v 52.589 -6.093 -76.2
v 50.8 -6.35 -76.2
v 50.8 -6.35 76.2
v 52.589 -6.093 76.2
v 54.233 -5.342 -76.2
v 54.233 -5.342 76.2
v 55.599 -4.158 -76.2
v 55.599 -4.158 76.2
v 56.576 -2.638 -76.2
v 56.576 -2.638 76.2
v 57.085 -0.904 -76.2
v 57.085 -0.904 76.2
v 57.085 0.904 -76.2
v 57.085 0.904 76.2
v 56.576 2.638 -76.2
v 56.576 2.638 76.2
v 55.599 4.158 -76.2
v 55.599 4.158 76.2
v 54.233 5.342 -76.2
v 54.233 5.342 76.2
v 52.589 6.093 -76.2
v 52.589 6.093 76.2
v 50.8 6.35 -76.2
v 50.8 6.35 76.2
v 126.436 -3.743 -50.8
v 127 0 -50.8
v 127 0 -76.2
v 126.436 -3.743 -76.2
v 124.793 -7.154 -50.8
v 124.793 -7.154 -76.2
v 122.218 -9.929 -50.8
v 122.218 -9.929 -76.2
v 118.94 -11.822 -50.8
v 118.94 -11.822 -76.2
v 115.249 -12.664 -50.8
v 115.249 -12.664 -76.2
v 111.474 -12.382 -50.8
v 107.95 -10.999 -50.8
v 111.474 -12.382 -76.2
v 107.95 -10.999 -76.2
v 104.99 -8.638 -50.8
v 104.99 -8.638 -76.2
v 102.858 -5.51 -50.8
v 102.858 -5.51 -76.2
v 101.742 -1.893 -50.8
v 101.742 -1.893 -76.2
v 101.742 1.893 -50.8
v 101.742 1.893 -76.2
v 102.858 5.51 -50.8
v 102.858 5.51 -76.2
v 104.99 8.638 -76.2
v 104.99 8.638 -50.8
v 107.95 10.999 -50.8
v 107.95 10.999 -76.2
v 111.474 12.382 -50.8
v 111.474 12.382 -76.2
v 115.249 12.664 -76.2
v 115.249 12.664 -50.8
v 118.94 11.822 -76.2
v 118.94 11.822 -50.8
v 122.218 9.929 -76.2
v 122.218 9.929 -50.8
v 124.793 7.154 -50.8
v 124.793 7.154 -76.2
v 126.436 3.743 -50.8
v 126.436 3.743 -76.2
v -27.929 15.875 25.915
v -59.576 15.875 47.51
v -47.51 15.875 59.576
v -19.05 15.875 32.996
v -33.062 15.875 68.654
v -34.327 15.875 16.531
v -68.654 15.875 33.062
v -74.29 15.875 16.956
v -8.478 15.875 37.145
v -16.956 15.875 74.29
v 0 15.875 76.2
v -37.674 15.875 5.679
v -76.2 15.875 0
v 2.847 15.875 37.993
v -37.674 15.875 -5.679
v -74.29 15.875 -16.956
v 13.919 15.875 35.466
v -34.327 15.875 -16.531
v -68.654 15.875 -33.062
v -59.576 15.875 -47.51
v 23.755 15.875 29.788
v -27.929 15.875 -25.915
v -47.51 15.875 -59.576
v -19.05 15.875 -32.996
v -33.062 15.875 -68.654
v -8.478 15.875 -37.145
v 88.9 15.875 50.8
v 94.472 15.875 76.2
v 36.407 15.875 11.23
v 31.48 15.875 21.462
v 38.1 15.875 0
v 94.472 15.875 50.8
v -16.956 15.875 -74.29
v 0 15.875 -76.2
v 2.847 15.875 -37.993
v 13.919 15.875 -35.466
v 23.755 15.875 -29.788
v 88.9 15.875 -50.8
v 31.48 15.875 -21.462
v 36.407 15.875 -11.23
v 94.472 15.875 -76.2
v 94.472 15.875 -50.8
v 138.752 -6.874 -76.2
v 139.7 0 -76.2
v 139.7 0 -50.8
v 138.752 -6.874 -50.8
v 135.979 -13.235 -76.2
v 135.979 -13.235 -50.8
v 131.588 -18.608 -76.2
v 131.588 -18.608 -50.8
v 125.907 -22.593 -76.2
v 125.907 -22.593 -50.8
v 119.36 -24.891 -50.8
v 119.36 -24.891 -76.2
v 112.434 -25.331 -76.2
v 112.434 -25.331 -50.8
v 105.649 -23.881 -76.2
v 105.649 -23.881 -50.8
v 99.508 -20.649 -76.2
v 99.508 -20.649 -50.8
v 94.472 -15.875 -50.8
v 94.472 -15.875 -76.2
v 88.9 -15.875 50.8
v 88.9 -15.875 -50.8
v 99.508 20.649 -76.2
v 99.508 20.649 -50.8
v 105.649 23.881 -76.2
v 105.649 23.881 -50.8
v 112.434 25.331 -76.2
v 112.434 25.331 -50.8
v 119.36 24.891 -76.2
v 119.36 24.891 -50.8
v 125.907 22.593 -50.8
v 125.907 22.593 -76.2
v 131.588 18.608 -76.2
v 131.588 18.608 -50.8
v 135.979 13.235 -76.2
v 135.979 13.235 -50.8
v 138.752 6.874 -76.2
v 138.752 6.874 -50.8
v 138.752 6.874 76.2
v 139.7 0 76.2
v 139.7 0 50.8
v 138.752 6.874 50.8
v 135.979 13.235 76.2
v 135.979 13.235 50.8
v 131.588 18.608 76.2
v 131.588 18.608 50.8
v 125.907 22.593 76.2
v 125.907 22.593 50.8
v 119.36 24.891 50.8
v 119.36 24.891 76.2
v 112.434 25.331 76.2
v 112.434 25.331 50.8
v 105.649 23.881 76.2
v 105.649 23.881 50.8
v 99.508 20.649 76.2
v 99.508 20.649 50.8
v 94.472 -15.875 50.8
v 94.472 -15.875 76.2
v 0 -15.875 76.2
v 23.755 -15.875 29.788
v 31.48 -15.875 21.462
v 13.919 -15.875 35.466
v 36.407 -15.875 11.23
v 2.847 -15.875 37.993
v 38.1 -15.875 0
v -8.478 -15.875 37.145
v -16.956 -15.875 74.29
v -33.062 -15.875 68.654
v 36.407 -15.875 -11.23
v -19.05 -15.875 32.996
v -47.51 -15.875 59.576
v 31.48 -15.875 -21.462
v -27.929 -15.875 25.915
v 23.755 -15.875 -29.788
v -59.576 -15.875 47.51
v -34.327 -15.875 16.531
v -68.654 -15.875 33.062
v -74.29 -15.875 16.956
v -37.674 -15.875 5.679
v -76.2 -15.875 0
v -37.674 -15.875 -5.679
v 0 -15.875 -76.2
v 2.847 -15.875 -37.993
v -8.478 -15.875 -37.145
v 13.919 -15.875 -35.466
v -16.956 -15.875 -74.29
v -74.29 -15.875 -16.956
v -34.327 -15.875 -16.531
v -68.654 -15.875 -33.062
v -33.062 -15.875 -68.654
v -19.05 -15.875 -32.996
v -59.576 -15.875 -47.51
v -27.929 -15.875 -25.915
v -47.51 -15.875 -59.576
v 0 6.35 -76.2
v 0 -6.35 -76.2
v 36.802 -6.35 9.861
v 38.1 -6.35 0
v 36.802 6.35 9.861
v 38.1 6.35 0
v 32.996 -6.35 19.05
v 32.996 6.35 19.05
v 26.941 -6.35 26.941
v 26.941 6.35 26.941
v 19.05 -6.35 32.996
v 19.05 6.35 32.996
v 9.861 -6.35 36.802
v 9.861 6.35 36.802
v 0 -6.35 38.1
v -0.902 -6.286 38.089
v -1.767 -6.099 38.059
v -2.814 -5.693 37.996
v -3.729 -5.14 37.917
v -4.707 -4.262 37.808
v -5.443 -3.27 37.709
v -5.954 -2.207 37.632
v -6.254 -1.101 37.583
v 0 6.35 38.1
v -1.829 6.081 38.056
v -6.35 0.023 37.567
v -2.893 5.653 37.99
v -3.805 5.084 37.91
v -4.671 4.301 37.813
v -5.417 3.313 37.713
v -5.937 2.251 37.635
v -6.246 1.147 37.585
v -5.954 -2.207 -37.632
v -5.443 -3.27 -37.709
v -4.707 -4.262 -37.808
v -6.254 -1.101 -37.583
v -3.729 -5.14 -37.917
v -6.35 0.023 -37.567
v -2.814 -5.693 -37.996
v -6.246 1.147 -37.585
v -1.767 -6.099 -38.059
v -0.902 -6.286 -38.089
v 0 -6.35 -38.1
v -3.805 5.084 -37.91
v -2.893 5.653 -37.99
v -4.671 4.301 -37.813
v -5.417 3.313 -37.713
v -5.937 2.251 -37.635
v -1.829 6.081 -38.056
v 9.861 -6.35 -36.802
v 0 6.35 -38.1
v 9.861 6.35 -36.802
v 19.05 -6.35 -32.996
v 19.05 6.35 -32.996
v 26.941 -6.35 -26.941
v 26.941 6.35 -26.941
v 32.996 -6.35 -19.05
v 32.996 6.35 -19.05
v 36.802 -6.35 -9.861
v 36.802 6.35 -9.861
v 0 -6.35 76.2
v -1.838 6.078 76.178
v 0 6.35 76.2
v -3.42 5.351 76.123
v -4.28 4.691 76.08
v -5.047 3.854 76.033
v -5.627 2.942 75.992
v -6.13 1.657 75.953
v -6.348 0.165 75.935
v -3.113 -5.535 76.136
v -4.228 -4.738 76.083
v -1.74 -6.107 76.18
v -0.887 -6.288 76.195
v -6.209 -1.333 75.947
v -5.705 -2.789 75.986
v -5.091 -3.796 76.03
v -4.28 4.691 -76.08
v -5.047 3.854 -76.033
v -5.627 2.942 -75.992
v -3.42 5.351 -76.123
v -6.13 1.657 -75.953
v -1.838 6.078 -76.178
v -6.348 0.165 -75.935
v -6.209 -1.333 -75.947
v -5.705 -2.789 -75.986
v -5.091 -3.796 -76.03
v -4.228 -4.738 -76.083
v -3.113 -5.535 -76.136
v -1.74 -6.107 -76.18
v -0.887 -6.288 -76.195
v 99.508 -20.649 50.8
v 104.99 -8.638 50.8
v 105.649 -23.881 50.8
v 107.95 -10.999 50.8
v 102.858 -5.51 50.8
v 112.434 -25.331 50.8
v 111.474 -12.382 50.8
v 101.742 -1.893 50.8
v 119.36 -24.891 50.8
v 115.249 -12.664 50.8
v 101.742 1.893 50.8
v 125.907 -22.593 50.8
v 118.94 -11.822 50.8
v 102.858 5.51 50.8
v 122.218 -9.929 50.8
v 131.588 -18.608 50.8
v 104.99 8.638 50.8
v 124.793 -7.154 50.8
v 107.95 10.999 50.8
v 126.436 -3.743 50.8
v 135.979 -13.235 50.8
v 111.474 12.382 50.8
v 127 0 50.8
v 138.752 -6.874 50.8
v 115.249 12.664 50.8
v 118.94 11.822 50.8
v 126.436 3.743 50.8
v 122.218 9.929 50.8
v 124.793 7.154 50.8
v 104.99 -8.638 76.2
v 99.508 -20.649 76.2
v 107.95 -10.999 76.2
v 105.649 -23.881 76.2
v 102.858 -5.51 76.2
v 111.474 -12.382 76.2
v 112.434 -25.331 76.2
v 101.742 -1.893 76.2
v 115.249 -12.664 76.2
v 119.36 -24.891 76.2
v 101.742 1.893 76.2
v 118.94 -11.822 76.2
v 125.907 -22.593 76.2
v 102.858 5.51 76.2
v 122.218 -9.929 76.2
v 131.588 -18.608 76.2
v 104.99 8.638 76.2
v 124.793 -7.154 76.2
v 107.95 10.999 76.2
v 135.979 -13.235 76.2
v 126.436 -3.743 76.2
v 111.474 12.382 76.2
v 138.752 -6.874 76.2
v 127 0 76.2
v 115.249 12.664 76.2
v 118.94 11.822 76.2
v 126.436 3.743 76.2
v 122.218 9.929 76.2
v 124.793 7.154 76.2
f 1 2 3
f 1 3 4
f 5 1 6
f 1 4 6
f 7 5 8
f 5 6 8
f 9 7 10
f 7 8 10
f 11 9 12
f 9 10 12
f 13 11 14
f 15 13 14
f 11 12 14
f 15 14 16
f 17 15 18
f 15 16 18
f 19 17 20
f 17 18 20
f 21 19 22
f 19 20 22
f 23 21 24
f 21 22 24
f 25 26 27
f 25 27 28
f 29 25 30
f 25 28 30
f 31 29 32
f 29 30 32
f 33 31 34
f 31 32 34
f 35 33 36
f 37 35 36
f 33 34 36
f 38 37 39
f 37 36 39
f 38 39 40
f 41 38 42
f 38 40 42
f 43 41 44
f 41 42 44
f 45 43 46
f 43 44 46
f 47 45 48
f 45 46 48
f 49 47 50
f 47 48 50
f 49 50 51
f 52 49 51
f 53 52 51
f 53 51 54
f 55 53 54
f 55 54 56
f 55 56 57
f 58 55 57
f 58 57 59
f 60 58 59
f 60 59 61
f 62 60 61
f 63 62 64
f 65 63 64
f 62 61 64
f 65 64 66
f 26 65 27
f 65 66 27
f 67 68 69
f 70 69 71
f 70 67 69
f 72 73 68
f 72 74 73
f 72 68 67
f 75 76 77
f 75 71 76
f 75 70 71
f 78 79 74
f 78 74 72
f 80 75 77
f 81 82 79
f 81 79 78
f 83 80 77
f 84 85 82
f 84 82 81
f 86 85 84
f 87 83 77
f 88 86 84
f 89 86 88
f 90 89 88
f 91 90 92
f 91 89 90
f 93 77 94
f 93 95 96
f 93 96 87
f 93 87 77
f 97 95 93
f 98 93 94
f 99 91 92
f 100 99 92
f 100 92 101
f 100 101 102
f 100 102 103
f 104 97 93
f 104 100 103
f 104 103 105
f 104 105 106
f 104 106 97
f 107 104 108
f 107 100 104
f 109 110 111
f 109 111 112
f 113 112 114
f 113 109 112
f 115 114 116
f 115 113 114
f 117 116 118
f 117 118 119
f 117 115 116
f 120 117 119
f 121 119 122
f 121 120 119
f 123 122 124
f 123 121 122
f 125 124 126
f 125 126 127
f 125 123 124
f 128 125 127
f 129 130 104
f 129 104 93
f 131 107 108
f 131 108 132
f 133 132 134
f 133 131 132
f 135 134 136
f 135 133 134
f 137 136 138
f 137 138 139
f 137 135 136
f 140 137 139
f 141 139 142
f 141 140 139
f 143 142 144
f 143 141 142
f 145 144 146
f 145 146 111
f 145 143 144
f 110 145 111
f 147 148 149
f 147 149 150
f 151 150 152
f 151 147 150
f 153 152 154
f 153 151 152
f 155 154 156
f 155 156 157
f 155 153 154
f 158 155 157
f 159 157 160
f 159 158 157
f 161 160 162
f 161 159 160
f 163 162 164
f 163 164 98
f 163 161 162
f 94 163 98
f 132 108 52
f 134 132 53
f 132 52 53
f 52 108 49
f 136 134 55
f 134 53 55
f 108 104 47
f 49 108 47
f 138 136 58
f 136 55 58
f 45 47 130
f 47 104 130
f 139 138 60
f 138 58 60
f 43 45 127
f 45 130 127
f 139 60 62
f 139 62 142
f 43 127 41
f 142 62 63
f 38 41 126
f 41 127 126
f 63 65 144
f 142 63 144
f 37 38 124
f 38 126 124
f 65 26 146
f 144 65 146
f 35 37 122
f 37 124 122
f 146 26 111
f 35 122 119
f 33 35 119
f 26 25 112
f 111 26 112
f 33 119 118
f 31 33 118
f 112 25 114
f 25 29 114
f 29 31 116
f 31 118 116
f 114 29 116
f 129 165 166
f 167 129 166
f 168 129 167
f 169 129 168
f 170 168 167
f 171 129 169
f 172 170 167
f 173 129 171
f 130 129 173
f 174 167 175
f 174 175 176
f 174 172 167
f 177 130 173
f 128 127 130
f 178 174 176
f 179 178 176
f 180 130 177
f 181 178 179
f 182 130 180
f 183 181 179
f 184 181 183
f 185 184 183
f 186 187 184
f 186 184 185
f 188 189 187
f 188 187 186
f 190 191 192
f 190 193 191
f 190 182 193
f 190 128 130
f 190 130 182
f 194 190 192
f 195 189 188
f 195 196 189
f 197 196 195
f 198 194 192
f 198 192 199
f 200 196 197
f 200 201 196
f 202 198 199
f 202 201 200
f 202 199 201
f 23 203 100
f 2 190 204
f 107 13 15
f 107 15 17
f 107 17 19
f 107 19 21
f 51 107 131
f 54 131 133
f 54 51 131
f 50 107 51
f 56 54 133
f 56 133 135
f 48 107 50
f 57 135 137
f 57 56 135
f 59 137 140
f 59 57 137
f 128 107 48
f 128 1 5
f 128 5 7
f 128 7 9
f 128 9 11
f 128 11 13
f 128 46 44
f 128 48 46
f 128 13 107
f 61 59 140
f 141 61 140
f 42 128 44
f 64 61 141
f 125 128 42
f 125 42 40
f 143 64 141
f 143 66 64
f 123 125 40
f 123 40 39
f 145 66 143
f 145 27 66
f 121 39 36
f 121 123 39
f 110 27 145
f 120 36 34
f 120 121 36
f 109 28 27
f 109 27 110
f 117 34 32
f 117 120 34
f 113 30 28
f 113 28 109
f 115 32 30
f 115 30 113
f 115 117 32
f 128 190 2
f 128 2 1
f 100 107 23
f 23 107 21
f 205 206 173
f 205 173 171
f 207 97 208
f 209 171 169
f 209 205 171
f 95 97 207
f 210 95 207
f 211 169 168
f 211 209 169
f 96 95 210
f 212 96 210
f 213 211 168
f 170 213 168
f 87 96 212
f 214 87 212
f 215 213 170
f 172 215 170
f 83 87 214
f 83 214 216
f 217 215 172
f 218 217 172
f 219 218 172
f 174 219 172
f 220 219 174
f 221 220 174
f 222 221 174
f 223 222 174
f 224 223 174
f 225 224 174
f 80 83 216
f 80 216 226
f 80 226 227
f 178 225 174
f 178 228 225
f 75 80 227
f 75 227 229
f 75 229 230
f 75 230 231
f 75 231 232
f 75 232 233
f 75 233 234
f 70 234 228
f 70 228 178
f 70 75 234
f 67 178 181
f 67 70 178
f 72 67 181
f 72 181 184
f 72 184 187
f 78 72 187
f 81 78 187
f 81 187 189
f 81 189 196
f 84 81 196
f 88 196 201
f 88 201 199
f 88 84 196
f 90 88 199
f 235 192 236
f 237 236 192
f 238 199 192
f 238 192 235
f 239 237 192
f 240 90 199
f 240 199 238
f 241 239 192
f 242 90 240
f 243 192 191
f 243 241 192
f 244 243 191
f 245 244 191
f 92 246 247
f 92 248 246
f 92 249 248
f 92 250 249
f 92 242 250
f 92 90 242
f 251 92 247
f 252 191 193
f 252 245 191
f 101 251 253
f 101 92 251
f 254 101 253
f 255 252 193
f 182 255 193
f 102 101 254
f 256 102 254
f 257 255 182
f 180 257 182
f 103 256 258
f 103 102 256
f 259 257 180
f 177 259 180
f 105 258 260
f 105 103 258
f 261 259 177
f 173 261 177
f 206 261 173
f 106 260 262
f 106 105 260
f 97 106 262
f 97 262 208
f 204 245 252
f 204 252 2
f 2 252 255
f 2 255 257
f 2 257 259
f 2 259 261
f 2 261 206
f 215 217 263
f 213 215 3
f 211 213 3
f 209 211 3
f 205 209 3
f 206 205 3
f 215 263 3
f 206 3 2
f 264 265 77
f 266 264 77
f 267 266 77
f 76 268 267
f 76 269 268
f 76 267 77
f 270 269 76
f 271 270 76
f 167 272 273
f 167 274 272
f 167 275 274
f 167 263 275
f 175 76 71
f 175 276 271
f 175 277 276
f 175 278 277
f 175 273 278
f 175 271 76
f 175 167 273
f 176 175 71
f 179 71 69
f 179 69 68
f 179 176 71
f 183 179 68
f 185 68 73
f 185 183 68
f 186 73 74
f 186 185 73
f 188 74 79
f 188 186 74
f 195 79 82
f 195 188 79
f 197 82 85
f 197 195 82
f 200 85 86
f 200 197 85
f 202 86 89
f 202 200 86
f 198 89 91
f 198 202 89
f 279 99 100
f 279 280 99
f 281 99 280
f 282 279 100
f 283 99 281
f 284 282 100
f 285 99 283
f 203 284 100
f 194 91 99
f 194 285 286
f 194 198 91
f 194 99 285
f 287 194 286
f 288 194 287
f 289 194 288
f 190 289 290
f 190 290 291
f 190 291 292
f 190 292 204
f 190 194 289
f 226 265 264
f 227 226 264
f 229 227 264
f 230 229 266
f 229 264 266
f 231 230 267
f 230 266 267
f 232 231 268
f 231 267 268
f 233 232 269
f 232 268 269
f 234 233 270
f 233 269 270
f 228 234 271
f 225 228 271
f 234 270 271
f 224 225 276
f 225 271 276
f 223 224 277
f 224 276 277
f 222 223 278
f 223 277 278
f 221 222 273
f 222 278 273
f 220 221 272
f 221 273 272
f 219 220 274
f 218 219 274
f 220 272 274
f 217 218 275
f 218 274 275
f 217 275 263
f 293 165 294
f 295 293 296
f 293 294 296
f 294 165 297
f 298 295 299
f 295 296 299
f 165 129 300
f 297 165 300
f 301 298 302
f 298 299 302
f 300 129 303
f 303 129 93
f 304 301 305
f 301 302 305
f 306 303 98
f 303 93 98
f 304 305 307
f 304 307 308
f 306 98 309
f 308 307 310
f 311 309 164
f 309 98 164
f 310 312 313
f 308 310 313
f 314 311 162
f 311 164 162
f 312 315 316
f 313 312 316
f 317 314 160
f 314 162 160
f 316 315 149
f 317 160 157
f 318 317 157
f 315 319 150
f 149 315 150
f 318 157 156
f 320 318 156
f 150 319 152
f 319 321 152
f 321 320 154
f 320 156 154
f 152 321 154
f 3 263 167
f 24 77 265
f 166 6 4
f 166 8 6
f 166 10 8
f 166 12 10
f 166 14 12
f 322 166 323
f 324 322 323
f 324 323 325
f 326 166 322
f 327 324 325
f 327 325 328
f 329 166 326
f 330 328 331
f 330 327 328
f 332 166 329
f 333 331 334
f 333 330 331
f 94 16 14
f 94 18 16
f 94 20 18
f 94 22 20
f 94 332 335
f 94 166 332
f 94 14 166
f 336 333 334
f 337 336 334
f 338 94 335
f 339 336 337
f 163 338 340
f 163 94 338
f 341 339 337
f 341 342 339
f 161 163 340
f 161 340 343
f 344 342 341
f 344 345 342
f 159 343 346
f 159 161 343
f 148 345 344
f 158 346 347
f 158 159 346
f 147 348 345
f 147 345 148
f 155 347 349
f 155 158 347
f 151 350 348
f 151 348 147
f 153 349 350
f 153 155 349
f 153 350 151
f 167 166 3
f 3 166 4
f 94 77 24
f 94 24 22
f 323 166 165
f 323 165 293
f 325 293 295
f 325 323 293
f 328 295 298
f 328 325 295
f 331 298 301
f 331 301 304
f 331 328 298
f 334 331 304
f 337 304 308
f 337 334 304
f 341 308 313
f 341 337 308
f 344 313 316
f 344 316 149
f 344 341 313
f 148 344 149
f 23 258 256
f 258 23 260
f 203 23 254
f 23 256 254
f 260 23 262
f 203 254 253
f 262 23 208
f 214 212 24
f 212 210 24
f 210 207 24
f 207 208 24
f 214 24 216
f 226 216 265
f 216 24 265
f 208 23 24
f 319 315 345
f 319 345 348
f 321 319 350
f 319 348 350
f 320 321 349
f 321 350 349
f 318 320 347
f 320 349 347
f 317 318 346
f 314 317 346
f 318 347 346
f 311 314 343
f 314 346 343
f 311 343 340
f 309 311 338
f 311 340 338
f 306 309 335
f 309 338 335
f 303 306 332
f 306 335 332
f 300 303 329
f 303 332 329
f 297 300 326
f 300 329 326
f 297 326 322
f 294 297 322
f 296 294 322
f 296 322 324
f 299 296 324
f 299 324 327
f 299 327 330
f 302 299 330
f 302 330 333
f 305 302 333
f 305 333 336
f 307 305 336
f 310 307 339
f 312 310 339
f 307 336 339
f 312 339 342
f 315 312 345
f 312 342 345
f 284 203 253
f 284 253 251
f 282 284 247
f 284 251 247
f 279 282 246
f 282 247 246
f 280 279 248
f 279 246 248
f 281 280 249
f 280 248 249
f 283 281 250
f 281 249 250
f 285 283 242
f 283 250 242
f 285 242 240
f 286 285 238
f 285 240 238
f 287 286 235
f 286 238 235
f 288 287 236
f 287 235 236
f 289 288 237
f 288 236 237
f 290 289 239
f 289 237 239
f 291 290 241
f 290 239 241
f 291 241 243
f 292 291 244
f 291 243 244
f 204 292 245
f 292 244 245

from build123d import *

# Parameters (mm, degrees)
F0_R     = 38.1
F1_DEPTH = 15.875
F3_DEPTH = 238.50152
F4_R     = 12.7
F5_DEPTH = 25.4
F6_R     = 12.7
F7_DEPTH = 25.4


with BuildPart() as f1:
    # F0 (on Front) → F1 (new body, symmetric)
    with BuildSketch(Plane.XZ):
        with BuildLine():
            Line((88.9, 76.2), (0, 76.2))
            ThreePointArc((0, 76.2), (-76.2, 0), (0, -76.2))
            Line((0, -76.2), (88.9, -76.2))
            Line((88.9, -76.2), (88.9, 76.2))
        make_face()
        Circle(F0_R, mode=Mode.SUBTRACT)
    extrude(amount=F1_DEPTH, both=True)

    # F2 (on face) → F3 (cut, symmetric)
    with BuildSketch(Plane.XY.offset(76.2)):
        with BuildLine():
            Line((50.8, 6.35), (0, 6.35))
            ThreePointArc((0, 6.35), (-6.35, 0), (0, -6.35))
            Line((0, -6.35), (50.8, -6.35))
            ThreePointArc((50.8, -6.35), (57.15, 0), (50.8, 6.35))
        make_face()
    extrude(amount=F3_DEPTH, both=True, mode=Mode.SUBTRACT)

    # F4 (on face) → F5 (join)
    with BuildSketch(Plane.XY.offset(76.2)):
        with BuildLine():
            Line((88.9, -15.875), (94.472131, -15.875))
            ThreePointArc((94.472131, -15.875), (90.333483, -8.412257), (88.9, 0))
            Line((88.9, 0), (88.9, -15.875))
        make_face()
        with BuildLine():
            ThreePointArc((94.472131, -15.875), (122.712257, -23.966517), (139.7, 0))
            ThreePointArc((139.7, 0), (122.712257, 23.966517), (94.472131, 15.875))
            ThreePointArc((94.472131, 15.875), (90.333483, 8.412257), (88.9, 0))
            ThreePointArc((88.9, 0), (90.333483, -8.412257), (94.472131, -15.875))
        make_face()
        with Locations((114.3, 0)):
            Circle(F4_R, mode=Mode.SUBTRACT)
        with BuildLine():
            ThreePointArc((88.9, 0), (90.333483, 8.412257), (94.472131, 15.875))
            Line((94.472131, 15.875), (88.9, 15.875))
            Line((88.9, 15.875), (88.9, 0))
        make_face()
    extrude(amount=-F5_DEPTH)

    # F6 (on face) → F7 (join)
    with BuildSketch(Plane(origin=(0, 0, -76.2), x_dir=(1, 0, 0), z_dir=(0, 0, -1))):
        with BuildLine():
            ThreePointArc((94.472131, -15.875), (122.712257, -23.966517), (139.7, 0))
            ThreePointArc((139.7, 0), (122.712257, 23.966517), (94.472131, 15.875))
            ThreePointArc((94.472131, 15.875), (90.333483, 8.412257), (88.9, 0))
            ThreePointArc((88.9, 0), (90.333483, -8.412257), (94.472131, -15.875))
        make_face()
        with Locations((114.3, 0)):
            Circle(F6_R, mode=Mode.SUBTRACT)
        with BuildLine():
            ThreePointArc((88.9, 0), (90.333483, 8.412257), (94.472131, 15.875))
            Line((94.472131, 15.875), (88.9, 15.875))
            Line((88.9, 15.875), (88.9, 0))
        make_face()
        with BuildLine():
            Line((88.9, -15.875), (94.472131, -15.875))
            ThreePointArc((94.472131, -15.875), (90.333483, -8.412257), (88.9, 0))
            Line((88.9, 0), (88.9, -15.875))
        make_face()
    extrude(amount=-F7_DEPTH)


solid = f1.part
